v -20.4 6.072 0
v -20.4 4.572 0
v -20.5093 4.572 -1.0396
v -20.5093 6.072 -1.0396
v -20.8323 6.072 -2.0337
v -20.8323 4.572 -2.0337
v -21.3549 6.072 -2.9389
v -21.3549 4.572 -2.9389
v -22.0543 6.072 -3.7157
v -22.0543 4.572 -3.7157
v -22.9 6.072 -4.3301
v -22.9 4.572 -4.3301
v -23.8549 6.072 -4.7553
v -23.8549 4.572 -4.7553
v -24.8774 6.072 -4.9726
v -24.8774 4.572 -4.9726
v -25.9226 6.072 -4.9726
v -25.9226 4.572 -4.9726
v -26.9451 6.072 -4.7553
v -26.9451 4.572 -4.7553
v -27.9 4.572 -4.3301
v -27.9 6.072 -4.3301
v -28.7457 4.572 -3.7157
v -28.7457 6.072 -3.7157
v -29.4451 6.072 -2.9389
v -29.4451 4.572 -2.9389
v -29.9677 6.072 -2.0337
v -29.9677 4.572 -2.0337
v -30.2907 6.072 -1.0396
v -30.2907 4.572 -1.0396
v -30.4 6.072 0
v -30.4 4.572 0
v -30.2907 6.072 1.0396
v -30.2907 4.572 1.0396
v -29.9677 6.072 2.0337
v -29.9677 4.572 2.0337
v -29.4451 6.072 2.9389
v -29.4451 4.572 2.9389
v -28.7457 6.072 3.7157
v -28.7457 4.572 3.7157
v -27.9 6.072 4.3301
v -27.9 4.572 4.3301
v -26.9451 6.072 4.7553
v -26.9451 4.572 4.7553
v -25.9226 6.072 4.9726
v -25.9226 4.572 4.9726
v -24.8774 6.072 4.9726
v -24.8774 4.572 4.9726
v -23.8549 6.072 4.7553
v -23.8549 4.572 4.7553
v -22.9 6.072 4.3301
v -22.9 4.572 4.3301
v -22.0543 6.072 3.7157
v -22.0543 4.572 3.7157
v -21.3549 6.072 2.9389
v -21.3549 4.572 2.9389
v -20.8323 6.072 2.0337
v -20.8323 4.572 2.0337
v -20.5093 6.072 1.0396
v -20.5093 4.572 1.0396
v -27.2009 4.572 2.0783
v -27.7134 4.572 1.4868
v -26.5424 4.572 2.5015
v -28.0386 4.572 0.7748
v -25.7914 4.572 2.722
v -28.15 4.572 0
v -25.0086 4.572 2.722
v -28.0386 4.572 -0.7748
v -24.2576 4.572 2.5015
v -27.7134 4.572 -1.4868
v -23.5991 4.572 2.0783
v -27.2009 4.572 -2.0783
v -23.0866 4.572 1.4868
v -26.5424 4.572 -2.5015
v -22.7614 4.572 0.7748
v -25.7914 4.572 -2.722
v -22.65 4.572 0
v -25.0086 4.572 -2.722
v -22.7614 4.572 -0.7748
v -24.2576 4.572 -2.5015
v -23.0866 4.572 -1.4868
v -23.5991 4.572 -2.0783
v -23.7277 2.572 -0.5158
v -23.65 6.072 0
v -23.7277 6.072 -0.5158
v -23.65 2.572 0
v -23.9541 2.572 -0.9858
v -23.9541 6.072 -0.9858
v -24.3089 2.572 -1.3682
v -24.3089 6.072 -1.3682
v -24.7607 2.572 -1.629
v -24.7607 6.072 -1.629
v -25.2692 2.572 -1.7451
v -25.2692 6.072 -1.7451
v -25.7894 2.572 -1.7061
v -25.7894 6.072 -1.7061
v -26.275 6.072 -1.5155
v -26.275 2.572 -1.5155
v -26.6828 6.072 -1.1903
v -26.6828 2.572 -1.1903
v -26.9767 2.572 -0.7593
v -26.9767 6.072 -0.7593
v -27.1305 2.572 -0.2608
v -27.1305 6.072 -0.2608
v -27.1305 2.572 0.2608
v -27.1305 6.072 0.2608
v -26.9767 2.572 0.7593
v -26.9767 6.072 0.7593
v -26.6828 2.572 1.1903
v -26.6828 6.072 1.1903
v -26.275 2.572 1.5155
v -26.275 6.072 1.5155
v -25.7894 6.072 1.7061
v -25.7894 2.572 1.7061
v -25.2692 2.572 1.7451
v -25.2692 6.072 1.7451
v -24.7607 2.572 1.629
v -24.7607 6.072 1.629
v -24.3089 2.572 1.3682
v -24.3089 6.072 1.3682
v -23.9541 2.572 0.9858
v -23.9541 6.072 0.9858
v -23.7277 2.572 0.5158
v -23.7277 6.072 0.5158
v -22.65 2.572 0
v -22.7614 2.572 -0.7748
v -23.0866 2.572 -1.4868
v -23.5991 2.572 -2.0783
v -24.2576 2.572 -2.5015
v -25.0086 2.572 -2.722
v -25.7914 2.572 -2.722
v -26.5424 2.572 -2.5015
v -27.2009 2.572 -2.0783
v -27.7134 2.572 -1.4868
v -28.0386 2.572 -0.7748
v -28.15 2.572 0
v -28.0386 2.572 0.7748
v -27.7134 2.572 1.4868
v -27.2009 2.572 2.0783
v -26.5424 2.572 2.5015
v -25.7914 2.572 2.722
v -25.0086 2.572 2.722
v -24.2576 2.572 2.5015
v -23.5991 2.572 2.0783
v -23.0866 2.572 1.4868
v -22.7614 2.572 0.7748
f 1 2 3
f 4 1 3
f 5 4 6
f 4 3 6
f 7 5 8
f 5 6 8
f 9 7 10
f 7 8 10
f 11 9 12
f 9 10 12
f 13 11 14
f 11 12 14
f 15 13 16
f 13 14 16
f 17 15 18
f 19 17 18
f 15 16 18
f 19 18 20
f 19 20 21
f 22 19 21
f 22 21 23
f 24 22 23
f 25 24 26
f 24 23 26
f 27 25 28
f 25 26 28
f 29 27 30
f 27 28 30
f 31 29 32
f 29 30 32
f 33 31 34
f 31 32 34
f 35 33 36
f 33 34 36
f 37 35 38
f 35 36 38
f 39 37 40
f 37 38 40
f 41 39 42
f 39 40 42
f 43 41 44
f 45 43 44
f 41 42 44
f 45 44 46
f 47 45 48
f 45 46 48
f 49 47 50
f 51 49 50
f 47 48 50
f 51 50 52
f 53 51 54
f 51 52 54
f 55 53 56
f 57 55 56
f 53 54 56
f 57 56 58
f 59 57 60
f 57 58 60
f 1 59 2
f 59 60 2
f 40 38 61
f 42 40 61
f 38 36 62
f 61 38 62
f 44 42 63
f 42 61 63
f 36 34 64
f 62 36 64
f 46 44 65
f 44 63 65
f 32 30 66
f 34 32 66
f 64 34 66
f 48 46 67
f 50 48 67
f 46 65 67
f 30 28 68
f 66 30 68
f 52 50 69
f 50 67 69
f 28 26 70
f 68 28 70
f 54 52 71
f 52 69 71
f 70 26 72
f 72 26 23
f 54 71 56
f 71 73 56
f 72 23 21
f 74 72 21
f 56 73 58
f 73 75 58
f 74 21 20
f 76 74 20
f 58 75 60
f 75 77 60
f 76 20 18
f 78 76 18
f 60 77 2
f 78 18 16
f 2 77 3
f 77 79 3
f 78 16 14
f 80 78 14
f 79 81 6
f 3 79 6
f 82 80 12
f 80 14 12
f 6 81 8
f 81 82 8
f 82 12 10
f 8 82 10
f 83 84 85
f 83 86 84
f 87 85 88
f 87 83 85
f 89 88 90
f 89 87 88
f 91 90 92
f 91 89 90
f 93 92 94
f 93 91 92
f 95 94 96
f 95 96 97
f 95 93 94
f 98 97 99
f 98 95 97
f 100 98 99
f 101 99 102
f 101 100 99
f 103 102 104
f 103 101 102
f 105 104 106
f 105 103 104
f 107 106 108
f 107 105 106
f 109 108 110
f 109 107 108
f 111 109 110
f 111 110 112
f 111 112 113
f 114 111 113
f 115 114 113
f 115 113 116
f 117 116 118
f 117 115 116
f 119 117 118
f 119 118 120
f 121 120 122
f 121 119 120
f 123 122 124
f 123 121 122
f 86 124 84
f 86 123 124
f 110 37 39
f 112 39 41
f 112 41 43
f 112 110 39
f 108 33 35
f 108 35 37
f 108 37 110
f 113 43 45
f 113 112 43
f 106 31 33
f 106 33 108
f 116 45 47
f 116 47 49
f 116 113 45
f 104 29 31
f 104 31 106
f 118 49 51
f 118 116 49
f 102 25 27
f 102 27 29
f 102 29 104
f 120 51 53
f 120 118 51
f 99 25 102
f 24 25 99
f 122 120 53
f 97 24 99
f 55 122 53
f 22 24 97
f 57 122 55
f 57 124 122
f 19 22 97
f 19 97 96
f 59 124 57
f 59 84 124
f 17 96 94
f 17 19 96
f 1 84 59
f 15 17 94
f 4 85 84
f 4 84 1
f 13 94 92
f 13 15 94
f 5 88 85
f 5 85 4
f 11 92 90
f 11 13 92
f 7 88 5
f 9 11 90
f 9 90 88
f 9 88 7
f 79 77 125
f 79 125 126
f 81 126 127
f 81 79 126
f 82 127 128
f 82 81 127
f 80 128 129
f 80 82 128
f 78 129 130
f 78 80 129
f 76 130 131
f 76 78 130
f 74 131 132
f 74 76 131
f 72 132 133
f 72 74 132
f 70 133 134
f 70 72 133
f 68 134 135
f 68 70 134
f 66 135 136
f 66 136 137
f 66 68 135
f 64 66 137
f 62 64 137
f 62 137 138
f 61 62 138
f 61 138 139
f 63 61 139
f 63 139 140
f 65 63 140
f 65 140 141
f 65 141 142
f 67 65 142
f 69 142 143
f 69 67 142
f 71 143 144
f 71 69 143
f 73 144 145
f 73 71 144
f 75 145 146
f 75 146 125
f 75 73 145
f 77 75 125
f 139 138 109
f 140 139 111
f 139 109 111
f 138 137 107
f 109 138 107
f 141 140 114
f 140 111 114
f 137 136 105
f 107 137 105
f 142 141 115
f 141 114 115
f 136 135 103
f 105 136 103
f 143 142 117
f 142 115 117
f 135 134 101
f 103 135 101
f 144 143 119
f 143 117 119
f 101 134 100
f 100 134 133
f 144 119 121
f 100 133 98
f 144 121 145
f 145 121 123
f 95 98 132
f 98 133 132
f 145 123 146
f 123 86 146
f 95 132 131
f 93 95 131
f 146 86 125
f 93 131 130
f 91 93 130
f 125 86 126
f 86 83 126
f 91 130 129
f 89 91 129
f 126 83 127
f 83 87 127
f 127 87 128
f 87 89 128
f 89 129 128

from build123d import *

# Parameters (mm, degrees)
SKETCH1_R           = 57.15
SKETCH1_R_2         = 1.397
SKETCH1_R_3         = 3.175
BOSS_EXTRUDE1_DEPTH = 4.572
SKETCH2_R           = 2.75
SKETCH2_R_2         = 1.75
BOSS_EXTRUDE2_DEPTH = 2
SKETCH3_R           = 5
SKETCH3_R_2         = 1.75
BOSS_EXTRUDE3_DEPTH = 1.5


with BuildPart() as part:
    # Sketch1 → Boss-Extrude1 (new body)
    with BuildSketch(Plane(origin=(0, 0, 0), x_dir=(1, 0, 0), z_dir=(0, 1, 0))):
        Circle(SKETCH1_R)
        with Locations((0, 6.35)):
            Circle(SKETCH1_R_2, mode=Mode.SUBTRACT)
        with Locations((0, 25.4)):
            Circle(SKETCH1_R_3, mode=Mode.SUBTRACT)
        with Locations((0, 50.8)):
            Circle(SKETCH1_R_3, mode=Mode.SUBTRACT)
        with Locations((25.4, 0)):
            Circle(SKETCH1_R_3, mode=Mode.SUBTRACT)
        with Locations((0, -25.4)):
            Circle(SKETCH1_R_3, mode=Mode.SUBTRACT)
        with Locations((-25.4, 0)):
            Circle(SKETCH1_R_3, mode=Mode.SUBTRACT)
        with Locations((6.35, 0)):
            Circle(SKETCH1_R_2, mode=Mode.SUBTRACT)
        with Locations((0, -6.35)):
            Circle(SKETCH1_R_2, mode=Mode.SUBTRACT)
        with Locations((-6.35, 0)):
            Circle(SKETCH1_R_2, mode=Mode.SUBTRACT)
        with Locations((35.921024484, 35.921024484)):
            Circle(SKETCH1_R_3, mode=Mode.SUBTRACT)
        with Locations((50.8, 0)):
            Circle(SKETCH1_R_3, mode=Mode.SUBTRACT)
        with Locations((35.921024484, -35.921024484)):
            Circle(SKETCH1_R_3, mode=Mode.SUBTRACT)
        with Locations((0, -50.8)):
            Circle(SKETCH1_R_3, mode=Mode.SUBTRACT)
        with Locations((-35.921024484, -35.921024484)):
            Circle(SKETCH1_R_3, mode=Mode.SUBTRACT)
        with Locations((-50.8, 0)):
            Circle(SKETCH1_R_3, mode=Mode.SUBTRACT)
        with Locations((-35.921024484, 35.921024484)):
            Circle(SKETCH1_R_3, mode=Mode.SUBTRACT)
    extrude(amount=BOSS_EXTRUDE1_DEPTH)


with BuildPart() as body_2:
    # Sketch2 → Boss-Extrude2 (new body)
    with BuildSketch(Plane(origin=(0, 4.572, 0), x_dir=(1, 0, 0), z_dir=(0, 1, 0))):
        with Locations((-25.4, 0)):
            Circle(SKETCH2_R)
        with Locations((-25.4, 0)):
            Circle(SKETCH2_R_2, mode=Mode.SUBTRACT)
    extrude(amount=-BOSS_EXTRUDE2_DEPTH)

    # Sketch3 → Boss-Extrude3 (add)
    with BuildSketch(Plane(origin=(0, 4.572, 0), x_dir=(1, 0, 0), z_dir=(0, 1, 0))):
        with Locations((-25.4, 0)):
            Circle(SKETCH3_R)
        with Locations((-25.4, 0)):
            Circle(SKETCH3_R_2, mode=Mode.SUBTRACT)
    extrude(amount=BOSS_EXTRUDE3_DEPTH)


solid = body_2.part
